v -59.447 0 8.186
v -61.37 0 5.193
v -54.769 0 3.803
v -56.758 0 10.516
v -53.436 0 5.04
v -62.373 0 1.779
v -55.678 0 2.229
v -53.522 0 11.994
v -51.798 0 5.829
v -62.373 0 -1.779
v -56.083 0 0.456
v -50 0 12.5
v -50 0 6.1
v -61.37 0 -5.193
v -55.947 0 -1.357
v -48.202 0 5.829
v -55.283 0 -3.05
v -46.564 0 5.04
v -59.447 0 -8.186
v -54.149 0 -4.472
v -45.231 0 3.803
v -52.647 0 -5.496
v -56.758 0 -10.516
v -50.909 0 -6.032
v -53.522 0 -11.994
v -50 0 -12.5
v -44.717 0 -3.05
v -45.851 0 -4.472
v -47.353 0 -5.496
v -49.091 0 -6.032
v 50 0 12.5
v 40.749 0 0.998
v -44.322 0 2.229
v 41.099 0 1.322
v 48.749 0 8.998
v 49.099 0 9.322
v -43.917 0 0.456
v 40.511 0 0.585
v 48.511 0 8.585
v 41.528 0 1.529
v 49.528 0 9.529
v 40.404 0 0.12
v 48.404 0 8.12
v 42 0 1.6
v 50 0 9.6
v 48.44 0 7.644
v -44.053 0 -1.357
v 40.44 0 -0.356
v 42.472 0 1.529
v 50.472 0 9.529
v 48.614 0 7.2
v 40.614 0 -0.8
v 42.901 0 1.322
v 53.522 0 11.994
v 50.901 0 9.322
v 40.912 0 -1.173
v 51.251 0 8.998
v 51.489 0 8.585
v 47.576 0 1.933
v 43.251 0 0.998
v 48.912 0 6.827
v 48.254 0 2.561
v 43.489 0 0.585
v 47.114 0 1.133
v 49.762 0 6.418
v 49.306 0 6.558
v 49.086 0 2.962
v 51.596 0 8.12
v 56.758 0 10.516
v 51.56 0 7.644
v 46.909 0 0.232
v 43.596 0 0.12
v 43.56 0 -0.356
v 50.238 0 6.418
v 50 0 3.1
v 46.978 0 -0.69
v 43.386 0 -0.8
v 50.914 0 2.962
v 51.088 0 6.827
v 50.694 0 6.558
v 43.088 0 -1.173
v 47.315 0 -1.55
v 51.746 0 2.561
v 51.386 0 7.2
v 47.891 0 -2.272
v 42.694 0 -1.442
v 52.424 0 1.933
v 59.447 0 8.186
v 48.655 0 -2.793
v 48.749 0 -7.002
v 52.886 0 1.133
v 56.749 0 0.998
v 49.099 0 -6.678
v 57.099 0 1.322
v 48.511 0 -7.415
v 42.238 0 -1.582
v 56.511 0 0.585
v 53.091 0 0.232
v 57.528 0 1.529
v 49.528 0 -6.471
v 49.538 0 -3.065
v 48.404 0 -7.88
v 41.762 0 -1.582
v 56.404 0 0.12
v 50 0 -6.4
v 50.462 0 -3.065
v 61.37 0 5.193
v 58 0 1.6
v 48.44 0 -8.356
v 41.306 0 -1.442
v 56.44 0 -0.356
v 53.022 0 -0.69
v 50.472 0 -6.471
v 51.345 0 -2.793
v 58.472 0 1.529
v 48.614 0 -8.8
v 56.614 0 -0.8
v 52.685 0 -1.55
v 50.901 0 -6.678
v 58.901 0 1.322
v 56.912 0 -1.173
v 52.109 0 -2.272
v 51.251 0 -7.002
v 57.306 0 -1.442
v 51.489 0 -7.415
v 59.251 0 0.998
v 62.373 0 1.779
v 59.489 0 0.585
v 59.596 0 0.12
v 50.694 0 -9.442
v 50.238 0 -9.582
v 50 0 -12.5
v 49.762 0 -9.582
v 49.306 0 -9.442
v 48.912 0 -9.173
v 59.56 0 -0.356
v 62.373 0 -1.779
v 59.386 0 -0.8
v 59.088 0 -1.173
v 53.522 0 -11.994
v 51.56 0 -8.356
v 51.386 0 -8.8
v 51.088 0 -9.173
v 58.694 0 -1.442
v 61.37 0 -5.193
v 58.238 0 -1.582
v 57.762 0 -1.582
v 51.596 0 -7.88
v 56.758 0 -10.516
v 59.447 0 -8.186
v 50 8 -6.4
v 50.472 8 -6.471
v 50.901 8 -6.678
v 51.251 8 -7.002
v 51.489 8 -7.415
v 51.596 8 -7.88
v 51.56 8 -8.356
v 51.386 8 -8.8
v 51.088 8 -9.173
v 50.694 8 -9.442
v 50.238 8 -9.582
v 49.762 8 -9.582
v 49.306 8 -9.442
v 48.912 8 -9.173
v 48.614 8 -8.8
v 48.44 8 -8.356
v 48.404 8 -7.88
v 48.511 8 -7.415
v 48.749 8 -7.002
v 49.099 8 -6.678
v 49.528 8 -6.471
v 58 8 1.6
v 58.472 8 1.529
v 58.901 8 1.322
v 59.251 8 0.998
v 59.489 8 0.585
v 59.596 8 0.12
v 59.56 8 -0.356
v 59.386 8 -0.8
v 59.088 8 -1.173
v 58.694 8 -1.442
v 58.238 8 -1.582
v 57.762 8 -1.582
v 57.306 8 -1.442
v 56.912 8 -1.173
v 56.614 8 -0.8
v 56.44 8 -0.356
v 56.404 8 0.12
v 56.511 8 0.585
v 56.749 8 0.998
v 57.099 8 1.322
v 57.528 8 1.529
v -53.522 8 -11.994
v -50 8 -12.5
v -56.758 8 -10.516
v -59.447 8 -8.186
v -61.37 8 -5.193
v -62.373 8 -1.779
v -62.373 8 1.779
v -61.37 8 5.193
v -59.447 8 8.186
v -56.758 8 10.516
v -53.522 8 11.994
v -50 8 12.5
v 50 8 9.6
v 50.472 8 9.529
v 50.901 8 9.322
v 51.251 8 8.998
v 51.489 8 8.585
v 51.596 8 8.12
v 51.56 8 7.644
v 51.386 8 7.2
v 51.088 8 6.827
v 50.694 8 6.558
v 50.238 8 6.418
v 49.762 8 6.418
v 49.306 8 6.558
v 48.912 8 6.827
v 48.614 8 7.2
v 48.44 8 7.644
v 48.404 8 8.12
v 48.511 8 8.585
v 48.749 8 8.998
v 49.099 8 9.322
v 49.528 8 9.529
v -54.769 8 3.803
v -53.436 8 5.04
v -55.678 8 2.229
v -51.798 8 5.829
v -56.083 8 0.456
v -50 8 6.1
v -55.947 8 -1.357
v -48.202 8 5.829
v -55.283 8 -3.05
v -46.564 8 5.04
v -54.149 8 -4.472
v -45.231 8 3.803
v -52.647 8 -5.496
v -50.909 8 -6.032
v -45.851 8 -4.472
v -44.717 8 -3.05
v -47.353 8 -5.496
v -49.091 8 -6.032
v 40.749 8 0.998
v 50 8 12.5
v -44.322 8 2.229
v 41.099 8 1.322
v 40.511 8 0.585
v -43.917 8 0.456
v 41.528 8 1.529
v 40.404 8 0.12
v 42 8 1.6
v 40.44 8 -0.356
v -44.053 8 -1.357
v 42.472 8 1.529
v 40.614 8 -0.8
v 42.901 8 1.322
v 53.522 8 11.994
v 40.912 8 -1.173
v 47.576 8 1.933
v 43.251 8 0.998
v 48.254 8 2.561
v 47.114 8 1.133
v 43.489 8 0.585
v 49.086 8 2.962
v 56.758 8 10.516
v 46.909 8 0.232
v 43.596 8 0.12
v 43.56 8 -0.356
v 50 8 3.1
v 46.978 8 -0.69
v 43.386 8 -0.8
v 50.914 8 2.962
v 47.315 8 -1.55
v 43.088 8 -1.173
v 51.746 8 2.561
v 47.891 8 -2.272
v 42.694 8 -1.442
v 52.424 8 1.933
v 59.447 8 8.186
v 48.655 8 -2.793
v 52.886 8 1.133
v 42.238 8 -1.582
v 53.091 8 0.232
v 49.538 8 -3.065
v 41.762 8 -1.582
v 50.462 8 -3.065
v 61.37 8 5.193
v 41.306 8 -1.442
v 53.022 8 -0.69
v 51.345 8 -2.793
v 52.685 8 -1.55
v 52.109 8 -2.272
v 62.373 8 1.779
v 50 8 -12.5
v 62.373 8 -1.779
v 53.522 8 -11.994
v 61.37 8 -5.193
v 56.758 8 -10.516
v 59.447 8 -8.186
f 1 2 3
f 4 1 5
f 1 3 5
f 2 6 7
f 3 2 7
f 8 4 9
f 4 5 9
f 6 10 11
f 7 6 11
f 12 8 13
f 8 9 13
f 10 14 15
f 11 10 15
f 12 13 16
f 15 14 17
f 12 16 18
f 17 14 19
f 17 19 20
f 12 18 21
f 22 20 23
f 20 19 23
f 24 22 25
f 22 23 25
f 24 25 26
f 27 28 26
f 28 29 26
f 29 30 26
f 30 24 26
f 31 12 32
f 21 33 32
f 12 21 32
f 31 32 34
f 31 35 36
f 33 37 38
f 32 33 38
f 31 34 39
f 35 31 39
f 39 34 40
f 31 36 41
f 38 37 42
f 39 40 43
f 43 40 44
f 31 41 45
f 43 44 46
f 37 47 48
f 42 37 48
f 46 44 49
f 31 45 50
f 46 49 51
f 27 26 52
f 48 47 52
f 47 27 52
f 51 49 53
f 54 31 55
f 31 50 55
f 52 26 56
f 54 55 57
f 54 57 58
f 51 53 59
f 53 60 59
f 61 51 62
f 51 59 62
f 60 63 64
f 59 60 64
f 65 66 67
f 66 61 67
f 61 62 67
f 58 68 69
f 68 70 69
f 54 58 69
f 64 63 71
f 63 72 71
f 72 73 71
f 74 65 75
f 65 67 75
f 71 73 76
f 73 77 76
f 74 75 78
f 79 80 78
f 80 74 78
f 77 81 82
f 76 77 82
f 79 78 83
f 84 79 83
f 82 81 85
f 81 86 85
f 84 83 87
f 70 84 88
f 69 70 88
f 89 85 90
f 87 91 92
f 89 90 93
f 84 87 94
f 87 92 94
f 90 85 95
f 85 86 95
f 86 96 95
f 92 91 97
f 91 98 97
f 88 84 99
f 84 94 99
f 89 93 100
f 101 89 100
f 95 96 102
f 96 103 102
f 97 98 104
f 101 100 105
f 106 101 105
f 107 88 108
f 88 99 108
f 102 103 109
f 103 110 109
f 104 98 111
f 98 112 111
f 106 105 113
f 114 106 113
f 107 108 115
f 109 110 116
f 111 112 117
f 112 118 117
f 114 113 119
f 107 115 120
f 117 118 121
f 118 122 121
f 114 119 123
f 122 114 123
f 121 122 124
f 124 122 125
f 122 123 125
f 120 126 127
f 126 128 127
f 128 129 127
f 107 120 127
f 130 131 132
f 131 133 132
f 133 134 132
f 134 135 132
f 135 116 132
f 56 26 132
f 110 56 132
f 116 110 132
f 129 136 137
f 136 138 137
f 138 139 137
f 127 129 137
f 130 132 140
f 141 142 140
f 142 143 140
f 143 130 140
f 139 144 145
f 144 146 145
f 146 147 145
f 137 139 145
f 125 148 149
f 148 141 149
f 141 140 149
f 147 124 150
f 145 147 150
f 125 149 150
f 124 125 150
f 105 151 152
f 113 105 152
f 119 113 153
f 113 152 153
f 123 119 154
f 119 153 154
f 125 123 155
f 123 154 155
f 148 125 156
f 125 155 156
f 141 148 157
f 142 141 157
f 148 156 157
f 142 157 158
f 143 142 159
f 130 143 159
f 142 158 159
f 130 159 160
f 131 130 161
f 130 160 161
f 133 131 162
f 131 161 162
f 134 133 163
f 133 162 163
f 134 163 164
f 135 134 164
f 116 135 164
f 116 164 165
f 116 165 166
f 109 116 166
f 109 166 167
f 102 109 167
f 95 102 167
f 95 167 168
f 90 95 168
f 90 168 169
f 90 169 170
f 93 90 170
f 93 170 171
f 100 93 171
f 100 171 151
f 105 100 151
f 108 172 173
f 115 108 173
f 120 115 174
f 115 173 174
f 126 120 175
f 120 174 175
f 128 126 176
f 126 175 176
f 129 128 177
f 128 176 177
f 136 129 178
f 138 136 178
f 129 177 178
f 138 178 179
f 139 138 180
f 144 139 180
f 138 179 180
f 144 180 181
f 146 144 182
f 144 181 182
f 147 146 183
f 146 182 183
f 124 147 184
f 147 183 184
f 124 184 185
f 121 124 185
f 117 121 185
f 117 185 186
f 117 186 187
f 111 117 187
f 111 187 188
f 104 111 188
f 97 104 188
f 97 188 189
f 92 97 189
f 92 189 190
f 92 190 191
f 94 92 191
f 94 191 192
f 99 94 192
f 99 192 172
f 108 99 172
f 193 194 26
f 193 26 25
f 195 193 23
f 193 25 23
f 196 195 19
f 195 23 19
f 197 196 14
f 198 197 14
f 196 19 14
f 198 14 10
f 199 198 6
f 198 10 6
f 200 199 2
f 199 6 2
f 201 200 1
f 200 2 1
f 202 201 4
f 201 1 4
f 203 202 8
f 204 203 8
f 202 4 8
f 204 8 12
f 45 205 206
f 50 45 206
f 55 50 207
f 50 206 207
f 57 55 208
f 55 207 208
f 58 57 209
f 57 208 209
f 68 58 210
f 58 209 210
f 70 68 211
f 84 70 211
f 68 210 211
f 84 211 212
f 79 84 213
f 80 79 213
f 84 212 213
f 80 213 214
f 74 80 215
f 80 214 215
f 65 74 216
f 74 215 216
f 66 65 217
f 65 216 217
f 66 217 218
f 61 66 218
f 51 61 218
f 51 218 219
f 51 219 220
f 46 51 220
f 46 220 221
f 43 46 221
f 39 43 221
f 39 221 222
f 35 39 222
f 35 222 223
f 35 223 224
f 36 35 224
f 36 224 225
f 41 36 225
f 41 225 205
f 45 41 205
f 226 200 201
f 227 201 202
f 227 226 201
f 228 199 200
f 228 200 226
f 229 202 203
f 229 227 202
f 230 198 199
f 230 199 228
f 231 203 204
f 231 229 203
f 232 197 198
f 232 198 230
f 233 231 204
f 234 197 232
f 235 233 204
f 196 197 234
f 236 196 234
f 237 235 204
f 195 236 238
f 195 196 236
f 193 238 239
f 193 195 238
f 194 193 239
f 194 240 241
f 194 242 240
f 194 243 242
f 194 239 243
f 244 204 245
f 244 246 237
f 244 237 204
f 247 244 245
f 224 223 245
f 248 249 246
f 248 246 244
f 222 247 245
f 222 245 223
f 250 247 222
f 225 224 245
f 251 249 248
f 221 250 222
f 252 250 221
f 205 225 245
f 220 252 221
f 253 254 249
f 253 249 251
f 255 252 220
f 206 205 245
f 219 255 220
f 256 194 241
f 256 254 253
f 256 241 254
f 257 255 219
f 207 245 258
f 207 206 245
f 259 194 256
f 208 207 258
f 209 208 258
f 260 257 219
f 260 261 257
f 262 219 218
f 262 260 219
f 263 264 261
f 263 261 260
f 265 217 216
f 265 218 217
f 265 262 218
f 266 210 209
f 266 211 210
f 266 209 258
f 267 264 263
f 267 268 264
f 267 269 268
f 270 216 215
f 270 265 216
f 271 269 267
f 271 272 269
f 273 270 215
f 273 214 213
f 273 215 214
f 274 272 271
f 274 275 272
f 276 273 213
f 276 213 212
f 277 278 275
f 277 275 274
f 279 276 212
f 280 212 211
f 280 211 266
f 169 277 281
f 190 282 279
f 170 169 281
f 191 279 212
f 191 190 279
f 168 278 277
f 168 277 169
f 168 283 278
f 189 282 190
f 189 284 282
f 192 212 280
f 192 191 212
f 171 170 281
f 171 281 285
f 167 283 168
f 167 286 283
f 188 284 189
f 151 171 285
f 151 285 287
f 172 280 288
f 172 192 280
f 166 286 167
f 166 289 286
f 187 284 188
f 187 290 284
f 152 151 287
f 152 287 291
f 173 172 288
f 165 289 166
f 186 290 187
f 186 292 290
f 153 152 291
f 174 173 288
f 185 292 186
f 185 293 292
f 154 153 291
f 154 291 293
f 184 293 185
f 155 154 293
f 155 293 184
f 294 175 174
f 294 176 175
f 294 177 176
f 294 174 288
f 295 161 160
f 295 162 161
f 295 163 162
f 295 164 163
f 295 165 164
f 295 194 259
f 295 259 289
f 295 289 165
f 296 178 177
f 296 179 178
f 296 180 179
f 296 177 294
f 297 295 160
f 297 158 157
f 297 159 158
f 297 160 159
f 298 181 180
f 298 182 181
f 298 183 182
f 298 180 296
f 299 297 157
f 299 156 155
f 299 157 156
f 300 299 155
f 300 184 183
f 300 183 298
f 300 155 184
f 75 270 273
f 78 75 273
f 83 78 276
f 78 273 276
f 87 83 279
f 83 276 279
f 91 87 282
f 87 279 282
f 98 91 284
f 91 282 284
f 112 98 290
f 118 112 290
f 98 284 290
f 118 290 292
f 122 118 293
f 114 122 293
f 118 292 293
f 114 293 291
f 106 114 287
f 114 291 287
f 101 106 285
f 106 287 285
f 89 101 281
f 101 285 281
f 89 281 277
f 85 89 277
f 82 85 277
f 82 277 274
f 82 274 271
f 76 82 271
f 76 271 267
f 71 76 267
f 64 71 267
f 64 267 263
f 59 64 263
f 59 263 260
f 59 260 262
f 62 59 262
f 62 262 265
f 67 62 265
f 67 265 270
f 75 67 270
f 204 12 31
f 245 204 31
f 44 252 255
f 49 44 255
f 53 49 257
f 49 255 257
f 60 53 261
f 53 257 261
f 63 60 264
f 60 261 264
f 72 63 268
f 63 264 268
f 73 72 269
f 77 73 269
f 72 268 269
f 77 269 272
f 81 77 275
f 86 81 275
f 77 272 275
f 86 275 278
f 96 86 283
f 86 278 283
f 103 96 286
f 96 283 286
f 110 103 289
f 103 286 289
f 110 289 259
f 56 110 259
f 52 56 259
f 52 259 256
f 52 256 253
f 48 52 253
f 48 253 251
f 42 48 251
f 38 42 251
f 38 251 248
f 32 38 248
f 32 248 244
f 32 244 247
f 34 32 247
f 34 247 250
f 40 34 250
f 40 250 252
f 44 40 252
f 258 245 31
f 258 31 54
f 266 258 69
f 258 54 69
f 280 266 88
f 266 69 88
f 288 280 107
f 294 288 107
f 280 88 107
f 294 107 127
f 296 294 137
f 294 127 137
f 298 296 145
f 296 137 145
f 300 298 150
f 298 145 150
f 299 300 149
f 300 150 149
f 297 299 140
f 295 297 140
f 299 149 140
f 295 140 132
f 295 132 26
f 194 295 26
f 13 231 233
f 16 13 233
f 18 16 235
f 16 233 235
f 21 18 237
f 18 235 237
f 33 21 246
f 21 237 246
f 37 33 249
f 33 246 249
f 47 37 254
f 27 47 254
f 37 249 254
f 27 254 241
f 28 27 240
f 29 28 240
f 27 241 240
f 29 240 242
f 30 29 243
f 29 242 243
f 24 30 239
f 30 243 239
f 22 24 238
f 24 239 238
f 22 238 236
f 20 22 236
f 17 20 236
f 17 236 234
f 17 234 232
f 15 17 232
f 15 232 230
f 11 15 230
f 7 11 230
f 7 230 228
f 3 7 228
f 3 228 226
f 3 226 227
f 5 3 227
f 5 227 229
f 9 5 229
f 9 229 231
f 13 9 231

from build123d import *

# Parameters (mm, degrees)
EXTRUDE_1_DEPTH     = 8
SKETCH_3_R          = 3.1
SKETCH_3_R_2        = 1.6
CUT_EXTRUDE_1_DEPTH = 65.237839316
SKETCH_4_R          = 6.1
CUT_EXTRUDE_2_DEPTH = 65.237839316


with BuildPart() as part:
    # 草图1 → 凸台-拉伸1 (new body)
    with BuildSketch(Plane(origin=(0, 0, 0), x_dir=(1, 0, 0), z_dir=(0, 1, 0))):
        with BuildLine():
            Line((-50, -12.5), (50, -12.5))
            ThreePointArc((50, -12.5), (62.5, 0), (50, 12.5))
            Line((50, 12.5), (-50, 12.5))
            ThreePointArc((-50, 12.5), (-62.5, 0), (-50, -12.5))
        make_face()
    extrude(amount=EXTRUDE_1_DEPTH)

    # 草图3 → 切除-拉伸1 (cut, through all)
    with BuildSketch(Plane(origin=(0, 8, 0), x_dir=(1, 0, 0), z_dir=(0, 1, 0))):
        with Locations(Location((-50, 0, 0), (0, 0, 270))):
            Circle(SKETCH_3_R)
        with Locations(Location((50, 8, 0), (0, 0, 270))):
            Circle(SKETCH_3_R_2)
        with Locations(Location((58, 0, 0), (0, 0, 270))):
            Circle(SKETCH_3_R_2)
        with Locations(Location((50, -8, 0), (0, 0, 270))):
            Circle(SKETCH_3_R_2)
        with Locations(Location((42, 0, 0), (0, 0, 270))):
            Circle(SKETCH_3_R_2)
        with Locations(Location((50, 0, 0), (0, 0, 270))):
            Circle(SKETCH_3_R)
    extrude(amount=-CUT_EXTRUDE_1_DEPTH, mode=Mode.SUBTRACT)

    # 草图4 → 切除-拉伸2 (cut, through all)
    with BuildSketch(Plane(origin=(0, 8, 0), x_dir=(1, 0, 0), z_dir=(0, 1, 0))):
        with Locations(Location((-50, 0, 0), (0, 0, 270))):
            Circle(SKETCH_4_R)
    extrude(amount=-CUT_EXTRUDE_2_DEPTH, mode=Mode.SUBTRACT)


solid = part.part
